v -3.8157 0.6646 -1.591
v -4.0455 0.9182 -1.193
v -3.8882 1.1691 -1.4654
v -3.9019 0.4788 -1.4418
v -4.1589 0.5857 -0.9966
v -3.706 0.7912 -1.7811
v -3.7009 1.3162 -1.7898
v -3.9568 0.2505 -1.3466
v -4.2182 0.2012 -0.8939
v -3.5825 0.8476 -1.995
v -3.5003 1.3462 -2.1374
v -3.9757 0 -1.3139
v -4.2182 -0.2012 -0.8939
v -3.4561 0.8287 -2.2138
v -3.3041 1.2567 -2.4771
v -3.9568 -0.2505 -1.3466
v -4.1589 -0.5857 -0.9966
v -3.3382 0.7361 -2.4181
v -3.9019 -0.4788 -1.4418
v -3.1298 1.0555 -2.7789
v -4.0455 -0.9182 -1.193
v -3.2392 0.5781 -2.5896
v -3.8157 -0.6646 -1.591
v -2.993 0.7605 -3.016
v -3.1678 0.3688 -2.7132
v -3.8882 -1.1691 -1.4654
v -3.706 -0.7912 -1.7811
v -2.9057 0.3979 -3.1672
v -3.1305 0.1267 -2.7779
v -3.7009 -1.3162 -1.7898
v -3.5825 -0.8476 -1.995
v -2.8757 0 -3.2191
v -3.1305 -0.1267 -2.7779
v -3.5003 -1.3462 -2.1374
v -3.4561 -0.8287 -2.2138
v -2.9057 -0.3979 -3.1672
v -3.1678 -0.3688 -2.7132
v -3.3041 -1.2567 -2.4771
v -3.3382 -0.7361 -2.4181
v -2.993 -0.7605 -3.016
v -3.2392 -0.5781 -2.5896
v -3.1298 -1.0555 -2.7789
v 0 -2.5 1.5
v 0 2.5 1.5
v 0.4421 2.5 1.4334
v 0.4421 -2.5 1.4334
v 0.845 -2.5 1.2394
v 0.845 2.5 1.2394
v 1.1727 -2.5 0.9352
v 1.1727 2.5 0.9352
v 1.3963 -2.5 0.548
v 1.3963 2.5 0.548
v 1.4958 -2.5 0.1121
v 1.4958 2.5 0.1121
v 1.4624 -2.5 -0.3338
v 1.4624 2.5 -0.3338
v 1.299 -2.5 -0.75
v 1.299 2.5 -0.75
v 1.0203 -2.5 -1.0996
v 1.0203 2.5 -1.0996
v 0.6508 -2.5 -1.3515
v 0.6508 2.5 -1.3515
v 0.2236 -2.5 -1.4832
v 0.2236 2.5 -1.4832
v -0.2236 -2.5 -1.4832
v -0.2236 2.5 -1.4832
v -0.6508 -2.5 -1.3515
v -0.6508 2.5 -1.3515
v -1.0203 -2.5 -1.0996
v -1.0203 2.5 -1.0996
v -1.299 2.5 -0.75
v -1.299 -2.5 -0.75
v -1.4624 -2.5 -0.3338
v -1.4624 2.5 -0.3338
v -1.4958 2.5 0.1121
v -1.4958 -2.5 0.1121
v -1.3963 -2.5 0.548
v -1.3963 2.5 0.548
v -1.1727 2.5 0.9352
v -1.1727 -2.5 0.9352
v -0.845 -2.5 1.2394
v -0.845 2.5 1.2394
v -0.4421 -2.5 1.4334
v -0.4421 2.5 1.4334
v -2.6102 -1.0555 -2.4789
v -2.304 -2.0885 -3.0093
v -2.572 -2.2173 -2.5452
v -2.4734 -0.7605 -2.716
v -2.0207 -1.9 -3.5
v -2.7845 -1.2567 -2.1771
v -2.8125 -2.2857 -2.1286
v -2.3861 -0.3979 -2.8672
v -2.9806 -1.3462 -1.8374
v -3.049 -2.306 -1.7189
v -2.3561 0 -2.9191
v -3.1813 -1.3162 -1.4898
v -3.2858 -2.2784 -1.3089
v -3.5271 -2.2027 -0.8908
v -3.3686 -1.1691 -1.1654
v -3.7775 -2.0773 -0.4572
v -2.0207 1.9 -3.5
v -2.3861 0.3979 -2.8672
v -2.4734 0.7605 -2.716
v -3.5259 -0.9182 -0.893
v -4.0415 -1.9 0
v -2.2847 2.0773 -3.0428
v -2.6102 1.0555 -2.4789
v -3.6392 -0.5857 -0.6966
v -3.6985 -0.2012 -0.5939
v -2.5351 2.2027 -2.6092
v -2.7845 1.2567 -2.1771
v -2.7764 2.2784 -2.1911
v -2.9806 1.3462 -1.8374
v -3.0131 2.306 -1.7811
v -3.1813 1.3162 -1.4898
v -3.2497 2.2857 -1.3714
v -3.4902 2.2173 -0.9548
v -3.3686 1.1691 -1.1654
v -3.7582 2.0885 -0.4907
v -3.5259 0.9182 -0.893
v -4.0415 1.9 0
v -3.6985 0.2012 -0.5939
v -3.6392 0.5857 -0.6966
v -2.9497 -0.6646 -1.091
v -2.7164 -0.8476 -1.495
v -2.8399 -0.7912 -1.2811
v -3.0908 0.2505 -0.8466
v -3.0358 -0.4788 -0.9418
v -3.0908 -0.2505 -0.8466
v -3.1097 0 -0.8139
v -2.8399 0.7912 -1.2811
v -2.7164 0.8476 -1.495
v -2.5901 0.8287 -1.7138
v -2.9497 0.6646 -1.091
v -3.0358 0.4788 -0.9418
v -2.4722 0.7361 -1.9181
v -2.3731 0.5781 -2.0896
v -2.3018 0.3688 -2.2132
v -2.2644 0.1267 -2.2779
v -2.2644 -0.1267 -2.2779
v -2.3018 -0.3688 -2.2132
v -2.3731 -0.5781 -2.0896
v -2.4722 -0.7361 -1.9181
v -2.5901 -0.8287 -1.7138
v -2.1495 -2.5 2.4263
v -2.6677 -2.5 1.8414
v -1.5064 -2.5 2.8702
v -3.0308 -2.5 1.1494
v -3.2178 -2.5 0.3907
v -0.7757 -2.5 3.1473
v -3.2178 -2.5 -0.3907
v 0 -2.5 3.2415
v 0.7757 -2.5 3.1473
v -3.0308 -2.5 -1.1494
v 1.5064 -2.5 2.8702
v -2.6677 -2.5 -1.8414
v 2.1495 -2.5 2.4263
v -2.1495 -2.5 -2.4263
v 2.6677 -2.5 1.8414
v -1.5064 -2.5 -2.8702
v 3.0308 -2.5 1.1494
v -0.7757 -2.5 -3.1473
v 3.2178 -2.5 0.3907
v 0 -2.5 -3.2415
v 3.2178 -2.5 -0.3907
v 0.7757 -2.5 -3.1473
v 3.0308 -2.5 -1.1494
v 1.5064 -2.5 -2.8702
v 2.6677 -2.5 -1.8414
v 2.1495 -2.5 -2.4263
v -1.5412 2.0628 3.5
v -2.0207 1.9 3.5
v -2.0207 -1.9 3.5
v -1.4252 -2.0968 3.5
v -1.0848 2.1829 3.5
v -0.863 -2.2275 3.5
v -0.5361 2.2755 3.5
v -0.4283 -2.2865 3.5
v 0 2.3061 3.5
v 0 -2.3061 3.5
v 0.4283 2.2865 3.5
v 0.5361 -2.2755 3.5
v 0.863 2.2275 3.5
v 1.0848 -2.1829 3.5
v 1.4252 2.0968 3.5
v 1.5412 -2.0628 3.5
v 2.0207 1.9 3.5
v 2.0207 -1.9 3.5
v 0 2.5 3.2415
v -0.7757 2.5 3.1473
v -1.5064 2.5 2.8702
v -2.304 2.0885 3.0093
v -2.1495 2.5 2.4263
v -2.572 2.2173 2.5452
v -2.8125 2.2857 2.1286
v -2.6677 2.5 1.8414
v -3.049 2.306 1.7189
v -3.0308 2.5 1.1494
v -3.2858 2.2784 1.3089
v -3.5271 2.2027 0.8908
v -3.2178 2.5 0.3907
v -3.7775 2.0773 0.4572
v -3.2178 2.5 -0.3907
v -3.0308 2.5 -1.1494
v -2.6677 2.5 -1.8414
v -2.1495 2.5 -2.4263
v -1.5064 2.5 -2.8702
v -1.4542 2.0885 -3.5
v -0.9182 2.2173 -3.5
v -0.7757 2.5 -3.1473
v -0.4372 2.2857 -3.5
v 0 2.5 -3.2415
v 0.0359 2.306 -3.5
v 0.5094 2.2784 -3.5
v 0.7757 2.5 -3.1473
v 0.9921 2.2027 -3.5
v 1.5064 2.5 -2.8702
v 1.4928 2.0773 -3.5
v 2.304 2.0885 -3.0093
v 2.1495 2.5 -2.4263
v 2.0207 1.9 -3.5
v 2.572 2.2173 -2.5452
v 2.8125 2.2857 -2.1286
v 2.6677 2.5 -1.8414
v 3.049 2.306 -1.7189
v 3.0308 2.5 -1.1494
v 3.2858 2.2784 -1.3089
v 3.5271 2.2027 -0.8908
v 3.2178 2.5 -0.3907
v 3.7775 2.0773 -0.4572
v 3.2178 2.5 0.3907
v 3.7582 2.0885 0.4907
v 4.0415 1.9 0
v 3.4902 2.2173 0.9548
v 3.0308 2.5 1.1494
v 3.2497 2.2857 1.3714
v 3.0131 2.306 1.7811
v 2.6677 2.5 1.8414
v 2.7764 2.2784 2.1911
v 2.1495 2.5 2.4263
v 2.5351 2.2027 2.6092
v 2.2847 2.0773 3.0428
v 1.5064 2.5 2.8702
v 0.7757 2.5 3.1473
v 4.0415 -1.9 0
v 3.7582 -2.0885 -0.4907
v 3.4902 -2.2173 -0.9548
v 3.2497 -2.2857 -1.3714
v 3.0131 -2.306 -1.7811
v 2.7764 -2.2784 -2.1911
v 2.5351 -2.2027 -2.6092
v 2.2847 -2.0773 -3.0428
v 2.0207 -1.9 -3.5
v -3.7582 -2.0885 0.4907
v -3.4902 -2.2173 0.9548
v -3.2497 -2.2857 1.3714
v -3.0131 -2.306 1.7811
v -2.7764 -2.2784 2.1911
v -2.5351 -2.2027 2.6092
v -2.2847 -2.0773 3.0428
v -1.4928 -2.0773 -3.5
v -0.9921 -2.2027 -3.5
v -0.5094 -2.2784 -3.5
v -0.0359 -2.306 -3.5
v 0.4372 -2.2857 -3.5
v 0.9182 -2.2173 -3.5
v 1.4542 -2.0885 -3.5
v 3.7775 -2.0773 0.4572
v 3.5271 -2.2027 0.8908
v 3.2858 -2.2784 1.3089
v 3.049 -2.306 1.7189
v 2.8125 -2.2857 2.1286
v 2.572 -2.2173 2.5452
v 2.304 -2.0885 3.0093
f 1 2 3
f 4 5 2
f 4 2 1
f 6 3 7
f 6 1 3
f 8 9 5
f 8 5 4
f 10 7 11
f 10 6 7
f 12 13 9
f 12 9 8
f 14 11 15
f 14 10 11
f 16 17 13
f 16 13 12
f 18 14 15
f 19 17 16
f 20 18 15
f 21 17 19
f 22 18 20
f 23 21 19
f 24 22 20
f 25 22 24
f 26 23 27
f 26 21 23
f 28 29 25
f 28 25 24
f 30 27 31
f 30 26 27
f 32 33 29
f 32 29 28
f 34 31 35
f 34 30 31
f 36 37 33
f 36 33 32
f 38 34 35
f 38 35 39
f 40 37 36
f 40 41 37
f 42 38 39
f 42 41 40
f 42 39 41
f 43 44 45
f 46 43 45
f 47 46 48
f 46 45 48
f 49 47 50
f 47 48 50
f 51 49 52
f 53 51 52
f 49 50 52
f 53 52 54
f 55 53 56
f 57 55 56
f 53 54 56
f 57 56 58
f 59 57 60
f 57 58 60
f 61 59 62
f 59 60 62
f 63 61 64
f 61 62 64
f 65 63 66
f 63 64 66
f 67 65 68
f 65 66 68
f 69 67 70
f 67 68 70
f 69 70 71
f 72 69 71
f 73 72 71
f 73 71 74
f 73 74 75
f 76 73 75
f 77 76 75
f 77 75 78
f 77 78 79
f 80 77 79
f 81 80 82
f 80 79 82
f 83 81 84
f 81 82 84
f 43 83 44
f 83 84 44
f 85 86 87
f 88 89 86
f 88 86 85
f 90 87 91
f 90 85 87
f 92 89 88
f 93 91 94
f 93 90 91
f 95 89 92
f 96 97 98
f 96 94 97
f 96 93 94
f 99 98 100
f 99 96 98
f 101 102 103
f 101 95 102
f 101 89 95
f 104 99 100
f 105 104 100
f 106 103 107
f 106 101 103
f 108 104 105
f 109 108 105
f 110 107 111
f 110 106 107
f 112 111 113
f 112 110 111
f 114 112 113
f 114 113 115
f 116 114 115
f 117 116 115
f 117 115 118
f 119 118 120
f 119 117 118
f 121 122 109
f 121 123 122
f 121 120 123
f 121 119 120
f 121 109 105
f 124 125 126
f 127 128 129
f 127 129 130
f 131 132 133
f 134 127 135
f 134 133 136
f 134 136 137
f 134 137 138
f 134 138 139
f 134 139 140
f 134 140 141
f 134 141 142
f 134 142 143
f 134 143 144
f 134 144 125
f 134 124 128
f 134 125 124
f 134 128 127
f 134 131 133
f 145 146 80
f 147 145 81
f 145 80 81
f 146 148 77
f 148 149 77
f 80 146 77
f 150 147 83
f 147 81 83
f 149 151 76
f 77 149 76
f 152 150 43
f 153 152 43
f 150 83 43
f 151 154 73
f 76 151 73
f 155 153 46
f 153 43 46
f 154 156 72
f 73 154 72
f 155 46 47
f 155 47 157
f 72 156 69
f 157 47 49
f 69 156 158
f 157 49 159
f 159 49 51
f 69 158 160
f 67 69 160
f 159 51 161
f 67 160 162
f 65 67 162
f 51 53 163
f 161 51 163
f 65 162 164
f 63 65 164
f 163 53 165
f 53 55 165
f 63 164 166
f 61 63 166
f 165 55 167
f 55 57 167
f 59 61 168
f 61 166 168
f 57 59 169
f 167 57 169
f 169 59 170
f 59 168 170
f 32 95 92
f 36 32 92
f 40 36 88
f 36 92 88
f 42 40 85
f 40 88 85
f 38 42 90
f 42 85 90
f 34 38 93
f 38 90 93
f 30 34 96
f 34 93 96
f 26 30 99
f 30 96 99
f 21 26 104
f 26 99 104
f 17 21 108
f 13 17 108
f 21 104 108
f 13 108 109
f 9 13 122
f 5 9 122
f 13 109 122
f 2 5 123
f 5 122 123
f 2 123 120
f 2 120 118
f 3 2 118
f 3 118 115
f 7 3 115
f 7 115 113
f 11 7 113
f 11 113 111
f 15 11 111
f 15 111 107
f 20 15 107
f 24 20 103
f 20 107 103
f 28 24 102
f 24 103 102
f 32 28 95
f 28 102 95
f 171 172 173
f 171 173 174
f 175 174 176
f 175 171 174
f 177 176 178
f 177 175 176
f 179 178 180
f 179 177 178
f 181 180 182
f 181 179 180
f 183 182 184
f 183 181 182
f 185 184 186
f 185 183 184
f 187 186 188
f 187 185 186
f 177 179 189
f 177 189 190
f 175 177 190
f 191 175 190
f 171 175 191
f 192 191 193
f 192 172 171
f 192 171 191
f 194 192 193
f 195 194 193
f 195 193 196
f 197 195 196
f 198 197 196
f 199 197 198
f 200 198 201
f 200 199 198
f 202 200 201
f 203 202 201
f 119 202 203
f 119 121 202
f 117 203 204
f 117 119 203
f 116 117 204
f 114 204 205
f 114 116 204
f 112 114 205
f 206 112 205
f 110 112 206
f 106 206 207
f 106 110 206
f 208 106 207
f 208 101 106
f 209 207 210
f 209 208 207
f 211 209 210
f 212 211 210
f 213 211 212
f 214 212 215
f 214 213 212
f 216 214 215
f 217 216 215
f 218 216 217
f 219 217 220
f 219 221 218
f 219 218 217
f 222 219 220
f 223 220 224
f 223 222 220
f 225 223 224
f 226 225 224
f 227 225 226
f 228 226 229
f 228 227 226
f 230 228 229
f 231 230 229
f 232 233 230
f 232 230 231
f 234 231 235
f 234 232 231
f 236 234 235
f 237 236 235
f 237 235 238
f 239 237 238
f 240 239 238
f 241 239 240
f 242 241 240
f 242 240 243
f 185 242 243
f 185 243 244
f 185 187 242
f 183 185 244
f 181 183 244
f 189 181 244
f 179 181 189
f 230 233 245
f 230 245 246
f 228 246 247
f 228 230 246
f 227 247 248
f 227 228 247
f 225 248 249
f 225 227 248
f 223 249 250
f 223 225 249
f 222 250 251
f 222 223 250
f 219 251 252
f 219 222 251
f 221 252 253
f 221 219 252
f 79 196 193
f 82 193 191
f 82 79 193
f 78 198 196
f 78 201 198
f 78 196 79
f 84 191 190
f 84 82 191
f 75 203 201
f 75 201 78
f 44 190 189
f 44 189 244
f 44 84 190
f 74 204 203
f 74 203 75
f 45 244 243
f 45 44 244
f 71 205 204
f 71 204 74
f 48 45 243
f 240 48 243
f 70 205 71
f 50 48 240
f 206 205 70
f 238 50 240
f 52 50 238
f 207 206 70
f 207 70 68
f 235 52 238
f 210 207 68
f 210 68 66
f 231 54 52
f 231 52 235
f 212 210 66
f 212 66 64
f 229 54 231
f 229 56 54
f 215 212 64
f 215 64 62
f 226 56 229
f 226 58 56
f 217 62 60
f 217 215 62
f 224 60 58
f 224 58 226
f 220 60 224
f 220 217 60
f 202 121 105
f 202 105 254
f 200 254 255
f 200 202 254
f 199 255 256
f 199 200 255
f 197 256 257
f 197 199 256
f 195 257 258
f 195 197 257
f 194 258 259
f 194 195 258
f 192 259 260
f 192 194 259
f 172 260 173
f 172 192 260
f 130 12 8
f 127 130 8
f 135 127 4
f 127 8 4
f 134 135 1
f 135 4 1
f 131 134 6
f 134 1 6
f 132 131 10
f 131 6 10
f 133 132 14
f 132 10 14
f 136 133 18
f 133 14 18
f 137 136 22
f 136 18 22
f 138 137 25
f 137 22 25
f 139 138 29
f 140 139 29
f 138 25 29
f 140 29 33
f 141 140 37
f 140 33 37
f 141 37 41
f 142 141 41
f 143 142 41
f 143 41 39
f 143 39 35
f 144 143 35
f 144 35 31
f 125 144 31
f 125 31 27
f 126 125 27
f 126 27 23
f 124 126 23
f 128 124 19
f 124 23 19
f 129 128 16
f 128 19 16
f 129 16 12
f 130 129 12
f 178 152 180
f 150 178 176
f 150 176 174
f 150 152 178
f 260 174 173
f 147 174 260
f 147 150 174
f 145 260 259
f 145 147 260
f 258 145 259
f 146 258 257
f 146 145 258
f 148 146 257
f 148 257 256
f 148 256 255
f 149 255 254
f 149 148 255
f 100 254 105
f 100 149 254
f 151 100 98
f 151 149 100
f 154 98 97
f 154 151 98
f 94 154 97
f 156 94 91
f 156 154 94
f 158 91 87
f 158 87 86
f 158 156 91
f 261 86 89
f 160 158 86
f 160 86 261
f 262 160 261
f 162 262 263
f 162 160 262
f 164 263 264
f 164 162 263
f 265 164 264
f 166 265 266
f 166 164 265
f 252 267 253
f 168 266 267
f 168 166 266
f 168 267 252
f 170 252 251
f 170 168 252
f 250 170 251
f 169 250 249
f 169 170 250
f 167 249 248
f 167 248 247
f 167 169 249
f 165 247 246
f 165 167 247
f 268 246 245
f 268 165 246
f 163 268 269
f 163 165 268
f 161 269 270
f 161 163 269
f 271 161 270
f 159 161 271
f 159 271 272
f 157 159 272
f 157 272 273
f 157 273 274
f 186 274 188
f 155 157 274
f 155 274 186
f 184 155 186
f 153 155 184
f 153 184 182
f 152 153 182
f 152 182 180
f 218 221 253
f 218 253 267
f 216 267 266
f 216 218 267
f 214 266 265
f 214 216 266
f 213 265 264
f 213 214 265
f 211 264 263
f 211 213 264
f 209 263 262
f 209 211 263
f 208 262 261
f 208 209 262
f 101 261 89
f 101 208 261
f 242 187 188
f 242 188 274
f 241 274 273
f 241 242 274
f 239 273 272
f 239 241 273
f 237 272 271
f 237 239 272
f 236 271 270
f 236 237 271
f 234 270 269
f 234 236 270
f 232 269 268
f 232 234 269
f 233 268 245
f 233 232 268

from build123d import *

# Parameters (mm, degrees)
BOSS_EXTRUDE1_DEPTH = 2.5
SKETCH4_R           = 1.5
CUT_EXTRUDE1_DEPTH  = 5
SKETCH5_R           = 1.35
BOSS_EXTRUDE2_DEPTH = 0.6
SKETCH6_R           = 0.85
CUT_EXTRUDE3_DEPTH  = 1


with BuildPart() as part:
    # Sketch1 → Boss-Extrude1 (new, symmetric)
    with BuildSketch(Plane(origin=(0, 0, 0), x_dir=(1, 0, 0), z_dir=(0, 1, 0))):
        Polygon((4.041451884, 0), (2.020725942, 3.5), (-2.020725942, 3.5), (-4.041451884, 0), (-2.020725942, -3.5), (2.020725942, -3.5), align=None)
    extrude(amount=BOSS_EXTRUDE1_DEPTH, both=True)

    # Sketch2 → Cut-Revolve1 (revolve, cut)
    with BuildSketch(Plane.XY, mode=Mode.PRIVATE) as cut_revolve1_sk:
        Polygon((4.041451884, 2.5), (3.241451884, 2.5), (4.041451884, 1.9), align=None)
        Polygon((4.041451884, -2.5), (4.041451884, -1.9), (3.241451884, -2.5), align=None)
    revolve(cut_revolve1_sk.sketch.rotate(Axis((0, 2.5, 0), (0, -1, 0)), 90), axis=Axis((0, 2.5, 0), (0, -1, 0)), mode=Mode.SUBTRACT)

    # Sketch4 → Cut-Extrude1 (cut)
    with BuildSketch(Plane(origin=(0, 2.5, 0), x_dir=(1, 0, 0), z_dir=(0, 1, 0))):
        with Locations(Location((0, 0, 0), (0, 0, 270))):
            Circle(SKETCH4_R)
    extrude(amount=-CUT_EXTRUDE1_DEPTH, mode=Mode.SUBTRACT)

    # Sketch5 → Boss-Extrude2 (add)
    with BuildSketch(Plane(origin=(-3.031088913, 0, -1.75), x_dir=(-0.4999999999999951, 0, 0.8660254037844415), z_dir=(-0.8660254037844416, 0, -0.49999999999999517))):
        with Locations(Location((0, 0, 0), (0, 0, 180))):
            Circle(SKETCH5_R)
    extrude(amount=BOSS_EXTRUDE2_DEPTH)

    # Sketch6 → Cut-Extrude3 (cut)
    with BuildSketch(Plane(origin=(-3.550704156, 0, -2.05), x_dir=(-0.4999999999999952, 0, 0.8660254037844414), z_dir=(-0.8660254037844414, 0, -0.4999999999999952))):
        Circle(SKETCH6_R)
    extrude(amount=-CUT_EXTRUDE3_DEPTH, mode=Mode.SUBTRACT)


solid = part.part
